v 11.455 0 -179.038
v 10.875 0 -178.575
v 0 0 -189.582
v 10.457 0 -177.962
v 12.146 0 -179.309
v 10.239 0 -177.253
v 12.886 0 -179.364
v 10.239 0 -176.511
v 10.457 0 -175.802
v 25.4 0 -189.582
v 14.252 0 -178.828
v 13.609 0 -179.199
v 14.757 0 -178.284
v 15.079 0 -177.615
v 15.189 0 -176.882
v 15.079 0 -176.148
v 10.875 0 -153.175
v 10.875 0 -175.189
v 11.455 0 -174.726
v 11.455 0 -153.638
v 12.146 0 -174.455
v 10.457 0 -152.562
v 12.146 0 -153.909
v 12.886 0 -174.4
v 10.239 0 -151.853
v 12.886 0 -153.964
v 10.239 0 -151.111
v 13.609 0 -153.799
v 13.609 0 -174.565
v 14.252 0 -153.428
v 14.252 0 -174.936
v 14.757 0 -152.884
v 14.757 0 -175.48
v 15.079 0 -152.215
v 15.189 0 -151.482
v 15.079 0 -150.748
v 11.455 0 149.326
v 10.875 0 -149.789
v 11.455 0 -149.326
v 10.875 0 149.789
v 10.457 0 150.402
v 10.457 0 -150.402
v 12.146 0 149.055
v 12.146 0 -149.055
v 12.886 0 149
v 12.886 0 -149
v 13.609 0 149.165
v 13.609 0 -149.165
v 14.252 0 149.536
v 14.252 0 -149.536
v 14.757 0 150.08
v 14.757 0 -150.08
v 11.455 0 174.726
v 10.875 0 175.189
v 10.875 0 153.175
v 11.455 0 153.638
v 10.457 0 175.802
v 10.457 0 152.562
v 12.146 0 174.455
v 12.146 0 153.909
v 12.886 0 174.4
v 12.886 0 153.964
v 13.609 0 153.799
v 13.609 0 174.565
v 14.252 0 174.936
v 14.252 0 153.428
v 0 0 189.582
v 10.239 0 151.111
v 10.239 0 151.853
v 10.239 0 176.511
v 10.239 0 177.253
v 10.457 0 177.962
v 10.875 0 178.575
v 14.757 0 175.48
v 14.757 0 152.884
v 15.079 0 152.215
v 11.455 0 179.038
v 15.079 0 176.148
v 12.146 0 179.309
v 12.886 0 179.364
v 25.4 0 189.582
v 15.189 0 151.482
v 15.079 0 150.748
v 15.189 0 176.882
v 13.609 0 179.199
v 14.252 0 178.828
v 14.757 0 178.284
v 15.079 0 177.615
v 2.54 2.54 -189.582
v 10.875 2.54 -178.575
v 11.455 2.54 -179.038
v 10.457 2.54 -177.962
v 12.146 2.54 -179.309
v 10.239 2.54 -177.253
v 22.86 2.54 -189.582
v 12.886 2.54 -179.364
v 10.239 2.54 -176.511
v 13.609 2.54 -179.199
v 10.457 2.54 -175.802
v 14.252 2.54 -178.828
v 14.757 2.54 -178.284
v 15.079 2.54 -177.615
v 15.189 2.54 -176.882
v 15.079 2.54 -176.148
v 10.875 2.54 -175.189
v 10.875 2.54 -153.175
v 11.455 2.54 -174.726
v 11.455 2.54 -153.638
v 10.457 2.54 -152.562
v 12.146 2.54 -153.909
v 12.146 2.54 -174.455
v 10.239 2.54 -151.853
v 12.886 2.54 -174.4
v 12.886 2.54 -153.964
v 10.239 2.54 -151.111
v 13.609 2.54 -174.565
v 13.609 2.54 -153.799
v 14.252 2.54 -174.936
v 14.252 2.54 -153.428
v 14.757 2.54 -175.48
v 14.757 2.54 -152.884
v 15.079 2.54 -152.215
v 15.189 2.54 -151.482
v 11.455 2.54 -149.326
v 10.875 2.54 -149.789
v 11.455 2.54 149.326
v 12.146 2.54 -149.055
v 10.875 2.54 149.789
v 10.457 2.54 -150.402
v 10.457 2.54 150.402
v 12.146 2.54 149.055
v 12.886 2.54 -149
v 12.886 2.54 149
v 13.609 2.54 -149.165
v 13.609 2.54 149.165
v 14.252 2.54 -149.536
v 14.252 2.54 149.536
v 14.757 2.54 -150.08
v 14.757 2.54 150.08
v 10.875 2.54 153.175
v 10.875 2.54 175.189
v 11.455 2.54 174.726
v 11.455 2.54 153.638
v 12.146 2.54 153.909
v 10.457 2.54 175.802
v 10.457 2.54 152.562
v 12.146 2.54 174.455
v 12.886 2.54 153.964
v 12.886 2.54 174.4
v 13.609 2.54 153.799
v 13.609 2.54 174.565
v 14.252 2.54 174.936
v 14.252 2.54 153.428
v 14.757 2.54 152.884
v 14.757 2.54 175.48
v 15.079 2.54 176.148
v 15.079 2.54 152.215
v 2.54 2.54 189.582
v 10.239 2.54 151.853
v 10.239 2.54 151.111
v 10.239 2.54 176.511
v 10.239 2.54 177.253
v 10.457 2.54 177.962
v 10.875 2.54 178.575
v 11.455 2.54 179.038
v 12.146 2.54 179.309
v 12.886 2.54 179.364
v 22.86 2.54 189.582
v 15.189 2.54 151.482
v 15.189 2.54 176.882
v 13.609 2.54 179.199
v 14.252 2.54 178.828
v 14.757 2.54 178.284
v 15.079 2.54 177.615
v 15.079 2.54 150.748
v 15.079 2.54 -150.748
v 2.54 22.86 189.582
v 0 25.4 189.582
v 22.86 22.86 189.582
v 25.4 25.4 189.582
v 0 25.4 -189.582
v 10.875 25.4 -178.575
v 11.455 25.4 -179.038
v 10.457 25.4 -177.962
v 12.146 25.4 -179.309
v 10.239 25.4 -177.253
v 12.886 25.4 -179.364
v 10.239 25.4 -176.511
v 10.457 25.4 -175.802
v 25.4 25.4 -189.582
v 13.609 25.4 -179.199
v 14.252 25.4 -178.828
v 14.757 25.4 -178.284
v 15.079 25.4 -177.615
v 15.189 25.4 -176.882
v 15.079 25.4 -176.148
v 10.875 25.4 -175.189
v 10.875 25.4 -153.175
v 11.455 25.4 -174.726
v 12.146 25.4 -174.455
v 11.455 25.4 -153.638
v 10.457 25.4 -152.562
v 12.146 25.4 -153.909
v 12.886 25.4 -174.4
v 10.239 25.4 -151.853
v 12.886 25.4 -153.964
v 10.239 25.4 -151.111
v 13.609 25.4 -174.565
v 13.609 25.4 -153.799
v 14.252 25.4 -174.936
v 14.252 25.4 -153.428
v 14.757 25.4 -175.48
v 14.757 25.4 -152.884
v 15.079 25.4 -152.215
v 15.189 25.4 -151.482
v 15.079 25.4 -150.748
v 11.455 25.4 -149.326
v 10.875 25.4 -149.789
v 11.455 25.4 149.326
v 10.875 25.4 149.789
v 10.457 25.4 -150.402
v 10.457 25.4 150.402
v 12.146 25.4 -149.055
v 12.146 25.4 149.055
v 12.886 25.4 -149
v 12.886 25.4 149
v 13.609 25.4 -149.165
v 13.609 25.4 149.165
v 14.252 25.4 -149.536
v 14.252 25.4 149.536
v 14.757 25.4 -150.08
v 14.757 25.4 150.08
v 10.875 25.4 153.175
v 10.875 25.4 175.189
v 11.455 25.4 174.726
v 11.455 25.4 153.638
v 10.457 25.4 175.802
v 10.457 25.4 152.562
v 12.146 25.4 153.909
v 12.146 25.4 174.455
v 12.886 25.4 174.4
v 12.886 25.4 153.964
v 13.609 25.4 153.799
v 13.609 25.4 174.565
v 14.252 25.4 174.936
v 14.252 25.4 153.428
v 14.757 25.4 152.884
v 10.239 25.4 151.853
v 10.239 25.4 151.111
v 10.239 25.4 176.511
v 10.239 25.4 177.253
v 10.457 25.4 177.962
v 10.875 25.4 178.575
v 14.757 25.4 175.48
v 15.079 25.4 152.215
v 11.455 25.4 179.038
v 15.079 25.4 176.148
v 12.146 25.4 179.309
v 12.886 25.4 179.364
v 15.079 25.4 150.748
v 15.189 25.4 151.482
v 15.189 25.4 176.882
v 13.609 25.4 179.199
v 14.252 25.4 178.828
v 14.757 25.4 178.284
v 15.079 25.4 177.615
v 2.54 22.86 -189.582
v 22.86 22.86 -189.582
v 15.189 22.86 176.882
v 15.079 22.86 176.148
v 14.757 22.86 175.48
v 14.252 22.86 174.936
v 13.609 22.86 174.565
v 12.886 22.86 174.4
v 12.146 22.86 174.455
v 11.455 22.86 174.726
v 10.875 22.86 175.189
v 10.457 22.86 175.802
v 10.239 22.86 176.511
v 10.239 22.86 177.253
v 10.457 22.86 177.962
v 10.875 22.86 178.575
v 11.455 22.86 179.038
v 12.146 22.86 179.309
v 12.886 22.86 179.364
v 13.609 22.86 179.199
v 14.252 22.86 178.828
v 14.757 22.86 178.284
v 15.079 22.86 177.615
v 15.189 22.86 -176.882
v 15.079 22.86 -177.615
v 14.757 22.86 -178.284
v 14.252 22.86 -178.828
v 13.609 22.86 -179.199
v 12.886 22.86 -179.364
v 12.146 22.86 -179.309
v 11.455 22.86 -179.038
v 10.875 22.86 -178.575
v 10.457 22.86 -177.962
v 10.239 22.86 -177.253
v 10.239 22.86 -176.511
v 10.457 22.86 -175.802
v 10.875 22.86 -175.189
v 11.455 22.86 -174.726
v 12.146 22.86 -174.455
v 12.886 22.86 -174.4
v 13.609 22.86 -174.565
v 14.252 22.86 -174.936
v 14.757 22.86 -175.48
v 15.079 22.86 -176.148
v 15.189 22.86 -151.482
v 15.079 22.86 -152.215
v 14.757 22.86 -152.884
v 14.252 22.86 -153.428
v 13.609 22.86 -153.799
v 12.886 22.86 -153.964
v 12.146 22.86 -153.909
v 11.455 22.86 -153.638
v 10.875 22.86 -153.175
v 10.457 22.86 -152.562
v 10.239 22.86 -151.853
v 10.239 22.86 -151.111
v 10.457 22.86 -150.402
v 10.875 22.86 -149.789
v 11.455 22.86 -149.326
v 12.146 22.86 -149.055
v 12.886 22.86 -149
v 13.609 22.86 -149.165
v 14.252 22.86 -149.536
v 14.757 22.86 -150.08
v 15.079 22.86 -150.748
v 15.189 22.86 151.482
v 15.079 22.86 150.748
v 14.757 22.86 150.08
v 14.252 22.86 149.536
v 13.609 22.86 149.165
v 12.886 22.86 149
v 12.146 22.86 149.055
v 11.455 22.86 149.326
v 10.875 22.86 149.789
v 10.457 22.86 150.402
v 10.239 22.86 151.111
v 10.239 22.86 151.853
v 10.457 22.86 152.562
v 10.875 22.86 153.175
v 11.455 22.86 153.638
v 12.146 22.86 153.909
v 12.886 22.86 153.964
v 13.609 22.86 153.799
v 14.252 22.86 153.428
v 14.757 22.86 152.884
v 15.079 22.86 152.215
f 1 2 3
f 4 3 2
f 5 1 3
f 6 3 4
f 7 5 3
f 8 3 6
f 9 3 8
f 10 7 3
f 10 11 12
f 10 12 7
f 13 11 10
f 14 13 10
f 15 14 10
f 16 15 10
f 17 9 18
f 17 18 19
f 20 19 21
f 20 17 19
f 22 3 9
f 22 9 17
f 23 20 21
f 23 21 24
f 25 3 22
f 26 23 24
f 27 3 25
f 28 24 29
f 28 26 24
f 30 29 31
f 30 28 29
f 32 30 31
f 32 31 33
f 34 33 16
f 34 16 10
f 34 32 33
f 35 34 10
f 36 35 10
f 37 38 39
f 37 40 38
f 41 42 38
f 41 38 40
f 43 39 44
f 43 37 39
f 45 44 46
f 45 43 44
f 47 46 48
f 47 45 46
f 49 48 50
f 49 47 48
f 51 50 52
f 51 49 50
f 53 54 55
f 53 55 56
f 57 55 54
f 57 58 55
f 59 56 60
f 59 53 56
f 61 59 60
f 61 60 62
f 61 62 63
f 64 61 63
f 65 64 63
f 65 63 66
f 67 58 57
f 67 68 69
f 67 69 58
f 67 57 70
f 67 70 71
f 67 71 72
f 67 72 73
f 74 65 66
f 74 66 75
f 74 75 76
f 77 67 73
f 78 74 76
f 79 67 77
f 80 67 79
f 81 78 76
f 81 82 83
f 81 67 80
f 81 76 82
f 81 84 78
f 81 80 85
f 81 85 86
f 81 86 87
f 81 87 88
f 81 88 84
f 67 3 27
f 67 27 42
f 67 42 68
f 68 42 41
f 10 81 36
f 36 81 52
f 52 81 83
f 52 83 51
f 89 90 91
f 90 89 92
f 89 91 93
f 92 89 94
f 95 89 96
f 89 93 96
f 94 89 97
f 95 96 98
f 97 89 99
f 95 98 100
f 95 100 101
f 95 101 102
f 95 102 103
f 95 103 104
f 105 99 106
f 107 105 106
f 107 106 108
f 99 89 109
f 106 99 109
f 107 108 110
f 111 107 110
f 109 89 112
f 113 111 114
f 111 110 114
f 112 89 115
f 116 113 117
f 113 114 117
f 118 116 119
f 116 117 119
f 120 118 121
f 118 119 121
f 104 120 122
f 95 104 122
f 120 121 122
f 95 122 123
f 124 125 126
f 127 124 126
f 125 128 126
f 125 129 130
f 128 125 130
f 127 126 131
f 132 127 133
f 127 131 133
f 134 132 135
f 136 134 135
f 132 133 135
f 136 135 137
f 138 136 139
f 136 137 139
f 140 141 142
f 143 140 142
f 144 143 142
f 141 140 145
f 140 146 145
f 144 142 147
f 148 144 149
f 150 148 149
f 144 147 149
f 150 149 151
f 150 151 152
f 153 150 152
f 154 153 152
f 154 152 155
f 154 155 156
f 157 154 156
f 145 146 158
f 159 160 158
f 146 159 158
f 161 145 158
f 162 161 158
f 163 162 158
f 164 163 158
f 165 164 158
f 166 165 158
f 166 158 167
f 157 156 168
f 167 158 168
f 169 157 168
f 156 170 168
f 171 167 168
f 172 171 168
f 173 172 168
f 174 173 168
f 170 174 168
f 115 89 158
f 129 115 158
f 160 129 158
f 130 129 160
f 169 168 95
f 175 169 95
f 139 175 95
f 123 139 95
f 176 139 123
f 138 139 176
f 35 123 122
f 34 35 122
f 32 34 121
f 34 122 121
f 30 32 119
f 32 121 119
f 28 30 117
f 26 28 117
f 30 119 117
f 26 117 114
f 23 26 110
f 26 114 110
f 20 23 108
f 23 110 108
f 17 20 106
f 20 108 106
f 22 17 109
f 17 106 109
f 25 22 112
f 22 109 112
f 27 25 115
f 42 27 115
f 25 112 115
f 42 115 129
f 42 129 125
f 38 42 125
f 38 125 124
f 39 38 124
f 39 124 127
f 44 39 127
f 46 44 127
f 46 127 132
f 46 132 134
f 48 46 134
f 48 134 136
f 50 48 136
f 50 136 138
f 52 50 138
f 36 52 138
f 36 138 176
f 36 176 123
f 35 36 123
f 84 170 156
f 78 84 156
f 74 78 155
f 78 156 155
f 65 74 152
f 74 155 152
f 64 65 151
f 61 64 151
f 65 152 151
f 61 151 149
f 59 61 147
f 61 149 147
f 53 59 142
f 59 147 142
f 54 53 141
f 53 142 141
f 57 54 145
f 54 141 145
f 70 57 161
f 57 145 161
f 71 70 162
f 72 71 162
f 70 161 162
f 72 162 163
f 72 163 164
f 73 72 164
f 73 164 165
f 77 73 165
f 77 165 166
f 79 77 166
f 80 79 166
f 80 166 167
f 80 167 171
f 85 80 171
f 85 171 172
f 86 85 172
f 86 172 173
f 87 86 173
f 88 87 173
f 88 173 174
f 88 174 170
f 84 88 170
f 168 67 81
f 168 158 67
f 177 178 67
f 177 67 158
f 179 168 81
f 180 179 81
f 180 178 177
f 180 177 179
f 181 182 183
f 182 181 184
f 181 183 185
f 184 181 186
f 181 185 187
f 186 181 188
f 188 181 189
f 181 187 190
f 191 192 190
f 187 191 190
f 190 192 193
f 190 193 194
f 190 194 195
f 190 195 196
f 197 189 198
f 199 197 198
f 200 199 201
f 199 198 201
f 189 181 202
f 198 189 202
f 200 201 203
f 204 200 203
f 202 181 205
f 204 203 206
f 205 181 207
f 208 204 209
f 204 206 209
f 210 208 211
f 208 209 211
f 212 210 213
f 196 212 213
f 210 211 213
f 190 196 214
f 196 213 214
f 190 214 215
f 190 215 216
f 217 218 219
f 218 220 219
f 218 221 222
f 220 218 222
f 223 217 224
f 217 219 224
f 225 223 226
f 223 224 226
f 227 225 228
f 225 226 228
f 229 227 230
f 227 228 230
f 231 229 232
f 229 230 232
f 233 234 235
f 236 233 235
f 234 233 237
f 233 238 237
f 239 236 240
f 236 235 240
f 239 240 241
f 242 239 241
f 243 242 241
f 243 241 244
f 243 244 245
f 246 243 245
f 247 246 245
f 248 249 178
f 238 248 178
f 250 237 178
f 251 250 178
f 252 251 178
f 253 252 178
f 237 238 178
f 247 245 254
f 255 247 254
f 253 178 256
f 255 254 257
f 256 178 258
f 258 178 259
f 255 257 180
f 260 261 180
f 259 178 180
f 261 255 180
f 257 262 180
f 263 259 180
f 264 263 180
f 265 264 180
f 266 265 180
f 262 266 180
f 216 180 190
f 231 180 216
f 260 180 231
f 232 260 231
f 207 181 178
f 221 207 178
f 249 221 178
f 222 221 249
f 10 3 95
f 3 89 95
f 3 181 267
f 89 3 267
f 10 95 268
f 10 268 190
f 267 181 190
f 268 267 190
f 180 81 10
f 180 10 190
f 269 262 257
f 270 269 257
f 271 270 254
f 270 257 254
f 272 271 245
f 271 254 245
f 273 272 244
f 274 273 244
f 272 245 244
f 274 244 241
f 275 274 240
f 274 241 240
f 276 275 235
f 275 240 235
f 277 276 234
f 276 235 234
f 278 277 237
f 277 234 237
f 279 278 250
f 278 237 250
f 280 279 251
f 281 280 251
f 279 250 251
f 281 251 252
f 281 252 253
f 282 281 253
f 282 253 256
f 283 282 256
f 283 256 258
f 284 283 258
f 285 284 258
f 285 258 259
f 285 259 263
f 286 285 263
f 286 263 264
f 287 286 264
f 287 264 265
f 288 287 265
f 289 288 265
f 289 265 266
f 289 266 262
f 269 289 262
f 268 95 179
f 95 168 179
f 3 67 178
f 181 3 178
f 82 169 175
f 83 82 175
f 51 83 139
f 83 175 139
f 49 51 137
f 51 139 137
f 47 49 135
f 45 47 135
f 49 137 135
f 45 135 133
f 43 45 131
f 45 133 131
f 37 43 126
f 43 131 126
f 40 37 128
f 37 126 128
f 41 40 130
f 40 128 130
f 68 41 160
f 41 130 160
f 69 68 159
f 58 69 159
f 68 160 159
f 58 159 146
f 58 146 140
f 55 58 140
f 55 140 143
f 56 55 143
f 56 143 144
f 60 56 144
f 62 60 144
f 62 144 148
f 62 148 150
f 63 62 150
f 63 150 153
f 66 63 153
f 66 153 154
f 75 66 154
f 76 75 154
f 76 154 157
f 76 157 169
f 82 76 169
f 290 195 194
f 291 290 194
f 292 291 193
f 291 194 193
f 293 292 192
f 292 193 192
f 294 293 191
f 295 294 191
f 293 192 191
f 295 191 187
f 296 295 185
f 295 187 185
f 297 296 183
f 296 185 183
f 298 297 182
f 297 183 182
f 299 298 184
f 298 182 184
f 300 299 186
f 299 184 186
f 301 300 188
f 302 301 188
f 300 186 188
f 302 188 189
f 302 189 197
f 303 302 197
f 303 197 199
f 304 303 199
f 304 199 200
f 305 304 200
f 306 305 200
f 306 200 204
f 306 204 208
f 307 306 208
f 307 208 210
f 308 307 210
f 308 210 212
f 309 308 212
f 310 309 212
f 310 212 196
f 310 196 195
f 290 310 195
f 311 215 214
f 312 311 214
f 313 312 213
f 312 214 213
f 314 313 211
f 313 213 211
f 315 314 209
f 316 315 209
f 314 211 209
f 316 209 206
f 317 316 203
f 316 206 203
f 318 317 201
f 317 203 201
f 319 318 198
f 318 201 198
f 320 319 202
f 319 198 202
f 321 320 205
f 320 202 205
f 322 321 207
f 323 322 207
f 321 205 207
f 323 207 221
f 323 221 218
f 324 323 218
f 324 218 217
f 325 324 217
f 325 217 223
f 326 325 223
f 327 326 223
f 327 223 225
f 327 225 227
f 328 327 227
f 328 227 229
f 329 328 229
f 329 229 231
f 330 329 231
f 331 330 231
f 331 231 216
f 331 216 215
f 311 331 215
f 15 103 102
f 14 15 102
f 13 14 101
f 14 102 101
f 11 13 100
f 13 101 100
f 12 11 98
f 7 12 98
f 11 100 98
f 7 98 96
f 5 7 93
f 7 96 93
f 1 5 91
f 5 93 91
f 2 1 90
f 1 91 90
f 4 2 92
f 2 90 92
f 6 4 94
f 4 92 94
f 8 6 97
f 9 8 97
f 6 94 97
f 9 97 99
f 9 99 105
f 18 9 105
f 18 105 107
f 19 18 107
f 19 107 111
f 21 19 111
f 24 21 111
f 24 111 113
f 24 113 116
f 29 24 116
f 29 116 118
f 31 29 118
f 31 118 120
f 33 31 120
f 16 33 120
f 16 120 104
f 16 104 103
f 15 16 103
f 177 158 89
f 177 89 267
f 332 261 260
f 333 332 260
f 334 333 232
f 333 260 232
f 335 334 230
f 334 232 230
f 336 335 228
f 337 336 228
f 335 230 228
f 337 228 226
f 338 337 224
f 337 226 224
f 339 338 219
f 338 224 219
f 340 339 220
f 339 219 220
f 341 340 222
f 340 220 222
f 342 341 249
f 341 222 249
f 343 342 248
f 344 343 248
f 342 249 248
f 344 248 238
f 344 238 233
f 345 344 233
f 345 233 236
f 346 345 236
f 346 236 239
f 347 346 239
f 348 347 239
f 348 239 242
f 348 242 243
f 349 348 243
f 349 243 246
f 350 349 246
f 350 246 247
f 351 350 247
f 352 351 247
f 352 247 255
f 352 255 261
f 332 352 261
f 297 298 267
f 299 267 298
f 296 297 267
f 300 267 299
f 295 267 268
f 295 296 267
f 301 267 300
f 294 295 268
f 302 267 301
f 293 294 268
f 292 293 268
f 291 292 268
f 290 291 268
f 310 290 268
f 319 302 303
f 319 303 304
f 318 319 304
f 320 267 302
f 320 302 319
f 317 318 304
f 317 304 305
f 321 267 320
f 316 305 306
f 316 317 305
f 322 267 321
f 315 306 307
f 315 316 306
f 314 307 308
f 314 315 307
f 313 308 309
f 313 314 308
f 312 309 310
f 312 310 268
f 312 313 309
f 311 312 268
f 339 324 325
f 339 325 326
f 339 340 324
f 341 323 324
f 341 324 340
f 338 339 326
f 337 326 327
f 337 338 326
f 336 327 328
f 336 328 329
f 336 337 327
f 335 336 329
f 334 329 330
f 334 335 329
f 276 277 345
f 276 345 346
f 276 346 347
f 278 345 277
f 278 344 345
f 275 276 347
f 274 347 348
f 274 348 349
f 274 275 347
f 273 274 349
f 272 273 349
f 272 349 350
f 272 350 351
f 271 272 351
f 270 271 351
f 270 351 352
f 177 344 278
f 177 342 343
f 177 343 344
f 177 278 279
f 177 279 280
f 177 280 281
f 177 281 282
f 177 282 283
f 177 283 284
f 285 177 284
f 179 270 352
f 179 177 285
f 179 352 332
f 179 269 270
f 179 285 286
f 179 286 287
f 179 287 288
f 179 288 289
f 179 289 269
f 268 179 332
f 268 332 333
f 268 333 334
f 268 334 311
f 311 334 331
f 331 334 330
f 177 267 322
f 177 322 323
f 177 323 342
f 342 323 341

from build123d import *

# Parameters (mm, degrees)
SKETCH1_W           = 25.4
SKETCH1_H           = 25.4
SKETCH1_W_2         = 20.32
SKETCH1_H_2         = 20.32
EXTRUDE_THIN1_DEPTH = 189.58179
SKETCH2_R           = 2.4892
CUT_EXTRUDE1_DEPTH  = 26.4


with BuildPart() as part:
    # Sketch1 → Extrude-Thin1 (new body, symmetric)
    with BuildSketch(Plane.XY):
        with Locations((12.7, 12.7)):
            Rectangle(SKETCH1_W, SKETCH1_H)
        with Locations((12.7, 12.7)):
            Rectangle(SKETCH1_W_2, SKETCH1_H_2, mode=Mode.SUBTRACT)
    extrude(amount=EXTRUDE_THIN1_DEPTH, both=True)

    # Sketch2 → Cut-Extrude1 (cut, through all)
    with BuildSketch(Plane(origin=(0, 25.4, 0), x_dir=(1, 0, 0), z_dir=(0, 1, 0))):
        with Locations((12.7, -176.88179)):
            Circle(SKETCH2_R)
        with Locations((12.7, -151.48179)):
            Circle(SKETCH2_R)
        with Locations((12.7, 176.88179)):
            Circle(SKETCH2_R)
        with Locations((12.7, 151.48179)):
            Circle(SKETCH2_R)
    extrude(amount=-CUT_EXTRUDE1_DEPTH, mode=Mode.SUBTRACT)


solid = part.part
